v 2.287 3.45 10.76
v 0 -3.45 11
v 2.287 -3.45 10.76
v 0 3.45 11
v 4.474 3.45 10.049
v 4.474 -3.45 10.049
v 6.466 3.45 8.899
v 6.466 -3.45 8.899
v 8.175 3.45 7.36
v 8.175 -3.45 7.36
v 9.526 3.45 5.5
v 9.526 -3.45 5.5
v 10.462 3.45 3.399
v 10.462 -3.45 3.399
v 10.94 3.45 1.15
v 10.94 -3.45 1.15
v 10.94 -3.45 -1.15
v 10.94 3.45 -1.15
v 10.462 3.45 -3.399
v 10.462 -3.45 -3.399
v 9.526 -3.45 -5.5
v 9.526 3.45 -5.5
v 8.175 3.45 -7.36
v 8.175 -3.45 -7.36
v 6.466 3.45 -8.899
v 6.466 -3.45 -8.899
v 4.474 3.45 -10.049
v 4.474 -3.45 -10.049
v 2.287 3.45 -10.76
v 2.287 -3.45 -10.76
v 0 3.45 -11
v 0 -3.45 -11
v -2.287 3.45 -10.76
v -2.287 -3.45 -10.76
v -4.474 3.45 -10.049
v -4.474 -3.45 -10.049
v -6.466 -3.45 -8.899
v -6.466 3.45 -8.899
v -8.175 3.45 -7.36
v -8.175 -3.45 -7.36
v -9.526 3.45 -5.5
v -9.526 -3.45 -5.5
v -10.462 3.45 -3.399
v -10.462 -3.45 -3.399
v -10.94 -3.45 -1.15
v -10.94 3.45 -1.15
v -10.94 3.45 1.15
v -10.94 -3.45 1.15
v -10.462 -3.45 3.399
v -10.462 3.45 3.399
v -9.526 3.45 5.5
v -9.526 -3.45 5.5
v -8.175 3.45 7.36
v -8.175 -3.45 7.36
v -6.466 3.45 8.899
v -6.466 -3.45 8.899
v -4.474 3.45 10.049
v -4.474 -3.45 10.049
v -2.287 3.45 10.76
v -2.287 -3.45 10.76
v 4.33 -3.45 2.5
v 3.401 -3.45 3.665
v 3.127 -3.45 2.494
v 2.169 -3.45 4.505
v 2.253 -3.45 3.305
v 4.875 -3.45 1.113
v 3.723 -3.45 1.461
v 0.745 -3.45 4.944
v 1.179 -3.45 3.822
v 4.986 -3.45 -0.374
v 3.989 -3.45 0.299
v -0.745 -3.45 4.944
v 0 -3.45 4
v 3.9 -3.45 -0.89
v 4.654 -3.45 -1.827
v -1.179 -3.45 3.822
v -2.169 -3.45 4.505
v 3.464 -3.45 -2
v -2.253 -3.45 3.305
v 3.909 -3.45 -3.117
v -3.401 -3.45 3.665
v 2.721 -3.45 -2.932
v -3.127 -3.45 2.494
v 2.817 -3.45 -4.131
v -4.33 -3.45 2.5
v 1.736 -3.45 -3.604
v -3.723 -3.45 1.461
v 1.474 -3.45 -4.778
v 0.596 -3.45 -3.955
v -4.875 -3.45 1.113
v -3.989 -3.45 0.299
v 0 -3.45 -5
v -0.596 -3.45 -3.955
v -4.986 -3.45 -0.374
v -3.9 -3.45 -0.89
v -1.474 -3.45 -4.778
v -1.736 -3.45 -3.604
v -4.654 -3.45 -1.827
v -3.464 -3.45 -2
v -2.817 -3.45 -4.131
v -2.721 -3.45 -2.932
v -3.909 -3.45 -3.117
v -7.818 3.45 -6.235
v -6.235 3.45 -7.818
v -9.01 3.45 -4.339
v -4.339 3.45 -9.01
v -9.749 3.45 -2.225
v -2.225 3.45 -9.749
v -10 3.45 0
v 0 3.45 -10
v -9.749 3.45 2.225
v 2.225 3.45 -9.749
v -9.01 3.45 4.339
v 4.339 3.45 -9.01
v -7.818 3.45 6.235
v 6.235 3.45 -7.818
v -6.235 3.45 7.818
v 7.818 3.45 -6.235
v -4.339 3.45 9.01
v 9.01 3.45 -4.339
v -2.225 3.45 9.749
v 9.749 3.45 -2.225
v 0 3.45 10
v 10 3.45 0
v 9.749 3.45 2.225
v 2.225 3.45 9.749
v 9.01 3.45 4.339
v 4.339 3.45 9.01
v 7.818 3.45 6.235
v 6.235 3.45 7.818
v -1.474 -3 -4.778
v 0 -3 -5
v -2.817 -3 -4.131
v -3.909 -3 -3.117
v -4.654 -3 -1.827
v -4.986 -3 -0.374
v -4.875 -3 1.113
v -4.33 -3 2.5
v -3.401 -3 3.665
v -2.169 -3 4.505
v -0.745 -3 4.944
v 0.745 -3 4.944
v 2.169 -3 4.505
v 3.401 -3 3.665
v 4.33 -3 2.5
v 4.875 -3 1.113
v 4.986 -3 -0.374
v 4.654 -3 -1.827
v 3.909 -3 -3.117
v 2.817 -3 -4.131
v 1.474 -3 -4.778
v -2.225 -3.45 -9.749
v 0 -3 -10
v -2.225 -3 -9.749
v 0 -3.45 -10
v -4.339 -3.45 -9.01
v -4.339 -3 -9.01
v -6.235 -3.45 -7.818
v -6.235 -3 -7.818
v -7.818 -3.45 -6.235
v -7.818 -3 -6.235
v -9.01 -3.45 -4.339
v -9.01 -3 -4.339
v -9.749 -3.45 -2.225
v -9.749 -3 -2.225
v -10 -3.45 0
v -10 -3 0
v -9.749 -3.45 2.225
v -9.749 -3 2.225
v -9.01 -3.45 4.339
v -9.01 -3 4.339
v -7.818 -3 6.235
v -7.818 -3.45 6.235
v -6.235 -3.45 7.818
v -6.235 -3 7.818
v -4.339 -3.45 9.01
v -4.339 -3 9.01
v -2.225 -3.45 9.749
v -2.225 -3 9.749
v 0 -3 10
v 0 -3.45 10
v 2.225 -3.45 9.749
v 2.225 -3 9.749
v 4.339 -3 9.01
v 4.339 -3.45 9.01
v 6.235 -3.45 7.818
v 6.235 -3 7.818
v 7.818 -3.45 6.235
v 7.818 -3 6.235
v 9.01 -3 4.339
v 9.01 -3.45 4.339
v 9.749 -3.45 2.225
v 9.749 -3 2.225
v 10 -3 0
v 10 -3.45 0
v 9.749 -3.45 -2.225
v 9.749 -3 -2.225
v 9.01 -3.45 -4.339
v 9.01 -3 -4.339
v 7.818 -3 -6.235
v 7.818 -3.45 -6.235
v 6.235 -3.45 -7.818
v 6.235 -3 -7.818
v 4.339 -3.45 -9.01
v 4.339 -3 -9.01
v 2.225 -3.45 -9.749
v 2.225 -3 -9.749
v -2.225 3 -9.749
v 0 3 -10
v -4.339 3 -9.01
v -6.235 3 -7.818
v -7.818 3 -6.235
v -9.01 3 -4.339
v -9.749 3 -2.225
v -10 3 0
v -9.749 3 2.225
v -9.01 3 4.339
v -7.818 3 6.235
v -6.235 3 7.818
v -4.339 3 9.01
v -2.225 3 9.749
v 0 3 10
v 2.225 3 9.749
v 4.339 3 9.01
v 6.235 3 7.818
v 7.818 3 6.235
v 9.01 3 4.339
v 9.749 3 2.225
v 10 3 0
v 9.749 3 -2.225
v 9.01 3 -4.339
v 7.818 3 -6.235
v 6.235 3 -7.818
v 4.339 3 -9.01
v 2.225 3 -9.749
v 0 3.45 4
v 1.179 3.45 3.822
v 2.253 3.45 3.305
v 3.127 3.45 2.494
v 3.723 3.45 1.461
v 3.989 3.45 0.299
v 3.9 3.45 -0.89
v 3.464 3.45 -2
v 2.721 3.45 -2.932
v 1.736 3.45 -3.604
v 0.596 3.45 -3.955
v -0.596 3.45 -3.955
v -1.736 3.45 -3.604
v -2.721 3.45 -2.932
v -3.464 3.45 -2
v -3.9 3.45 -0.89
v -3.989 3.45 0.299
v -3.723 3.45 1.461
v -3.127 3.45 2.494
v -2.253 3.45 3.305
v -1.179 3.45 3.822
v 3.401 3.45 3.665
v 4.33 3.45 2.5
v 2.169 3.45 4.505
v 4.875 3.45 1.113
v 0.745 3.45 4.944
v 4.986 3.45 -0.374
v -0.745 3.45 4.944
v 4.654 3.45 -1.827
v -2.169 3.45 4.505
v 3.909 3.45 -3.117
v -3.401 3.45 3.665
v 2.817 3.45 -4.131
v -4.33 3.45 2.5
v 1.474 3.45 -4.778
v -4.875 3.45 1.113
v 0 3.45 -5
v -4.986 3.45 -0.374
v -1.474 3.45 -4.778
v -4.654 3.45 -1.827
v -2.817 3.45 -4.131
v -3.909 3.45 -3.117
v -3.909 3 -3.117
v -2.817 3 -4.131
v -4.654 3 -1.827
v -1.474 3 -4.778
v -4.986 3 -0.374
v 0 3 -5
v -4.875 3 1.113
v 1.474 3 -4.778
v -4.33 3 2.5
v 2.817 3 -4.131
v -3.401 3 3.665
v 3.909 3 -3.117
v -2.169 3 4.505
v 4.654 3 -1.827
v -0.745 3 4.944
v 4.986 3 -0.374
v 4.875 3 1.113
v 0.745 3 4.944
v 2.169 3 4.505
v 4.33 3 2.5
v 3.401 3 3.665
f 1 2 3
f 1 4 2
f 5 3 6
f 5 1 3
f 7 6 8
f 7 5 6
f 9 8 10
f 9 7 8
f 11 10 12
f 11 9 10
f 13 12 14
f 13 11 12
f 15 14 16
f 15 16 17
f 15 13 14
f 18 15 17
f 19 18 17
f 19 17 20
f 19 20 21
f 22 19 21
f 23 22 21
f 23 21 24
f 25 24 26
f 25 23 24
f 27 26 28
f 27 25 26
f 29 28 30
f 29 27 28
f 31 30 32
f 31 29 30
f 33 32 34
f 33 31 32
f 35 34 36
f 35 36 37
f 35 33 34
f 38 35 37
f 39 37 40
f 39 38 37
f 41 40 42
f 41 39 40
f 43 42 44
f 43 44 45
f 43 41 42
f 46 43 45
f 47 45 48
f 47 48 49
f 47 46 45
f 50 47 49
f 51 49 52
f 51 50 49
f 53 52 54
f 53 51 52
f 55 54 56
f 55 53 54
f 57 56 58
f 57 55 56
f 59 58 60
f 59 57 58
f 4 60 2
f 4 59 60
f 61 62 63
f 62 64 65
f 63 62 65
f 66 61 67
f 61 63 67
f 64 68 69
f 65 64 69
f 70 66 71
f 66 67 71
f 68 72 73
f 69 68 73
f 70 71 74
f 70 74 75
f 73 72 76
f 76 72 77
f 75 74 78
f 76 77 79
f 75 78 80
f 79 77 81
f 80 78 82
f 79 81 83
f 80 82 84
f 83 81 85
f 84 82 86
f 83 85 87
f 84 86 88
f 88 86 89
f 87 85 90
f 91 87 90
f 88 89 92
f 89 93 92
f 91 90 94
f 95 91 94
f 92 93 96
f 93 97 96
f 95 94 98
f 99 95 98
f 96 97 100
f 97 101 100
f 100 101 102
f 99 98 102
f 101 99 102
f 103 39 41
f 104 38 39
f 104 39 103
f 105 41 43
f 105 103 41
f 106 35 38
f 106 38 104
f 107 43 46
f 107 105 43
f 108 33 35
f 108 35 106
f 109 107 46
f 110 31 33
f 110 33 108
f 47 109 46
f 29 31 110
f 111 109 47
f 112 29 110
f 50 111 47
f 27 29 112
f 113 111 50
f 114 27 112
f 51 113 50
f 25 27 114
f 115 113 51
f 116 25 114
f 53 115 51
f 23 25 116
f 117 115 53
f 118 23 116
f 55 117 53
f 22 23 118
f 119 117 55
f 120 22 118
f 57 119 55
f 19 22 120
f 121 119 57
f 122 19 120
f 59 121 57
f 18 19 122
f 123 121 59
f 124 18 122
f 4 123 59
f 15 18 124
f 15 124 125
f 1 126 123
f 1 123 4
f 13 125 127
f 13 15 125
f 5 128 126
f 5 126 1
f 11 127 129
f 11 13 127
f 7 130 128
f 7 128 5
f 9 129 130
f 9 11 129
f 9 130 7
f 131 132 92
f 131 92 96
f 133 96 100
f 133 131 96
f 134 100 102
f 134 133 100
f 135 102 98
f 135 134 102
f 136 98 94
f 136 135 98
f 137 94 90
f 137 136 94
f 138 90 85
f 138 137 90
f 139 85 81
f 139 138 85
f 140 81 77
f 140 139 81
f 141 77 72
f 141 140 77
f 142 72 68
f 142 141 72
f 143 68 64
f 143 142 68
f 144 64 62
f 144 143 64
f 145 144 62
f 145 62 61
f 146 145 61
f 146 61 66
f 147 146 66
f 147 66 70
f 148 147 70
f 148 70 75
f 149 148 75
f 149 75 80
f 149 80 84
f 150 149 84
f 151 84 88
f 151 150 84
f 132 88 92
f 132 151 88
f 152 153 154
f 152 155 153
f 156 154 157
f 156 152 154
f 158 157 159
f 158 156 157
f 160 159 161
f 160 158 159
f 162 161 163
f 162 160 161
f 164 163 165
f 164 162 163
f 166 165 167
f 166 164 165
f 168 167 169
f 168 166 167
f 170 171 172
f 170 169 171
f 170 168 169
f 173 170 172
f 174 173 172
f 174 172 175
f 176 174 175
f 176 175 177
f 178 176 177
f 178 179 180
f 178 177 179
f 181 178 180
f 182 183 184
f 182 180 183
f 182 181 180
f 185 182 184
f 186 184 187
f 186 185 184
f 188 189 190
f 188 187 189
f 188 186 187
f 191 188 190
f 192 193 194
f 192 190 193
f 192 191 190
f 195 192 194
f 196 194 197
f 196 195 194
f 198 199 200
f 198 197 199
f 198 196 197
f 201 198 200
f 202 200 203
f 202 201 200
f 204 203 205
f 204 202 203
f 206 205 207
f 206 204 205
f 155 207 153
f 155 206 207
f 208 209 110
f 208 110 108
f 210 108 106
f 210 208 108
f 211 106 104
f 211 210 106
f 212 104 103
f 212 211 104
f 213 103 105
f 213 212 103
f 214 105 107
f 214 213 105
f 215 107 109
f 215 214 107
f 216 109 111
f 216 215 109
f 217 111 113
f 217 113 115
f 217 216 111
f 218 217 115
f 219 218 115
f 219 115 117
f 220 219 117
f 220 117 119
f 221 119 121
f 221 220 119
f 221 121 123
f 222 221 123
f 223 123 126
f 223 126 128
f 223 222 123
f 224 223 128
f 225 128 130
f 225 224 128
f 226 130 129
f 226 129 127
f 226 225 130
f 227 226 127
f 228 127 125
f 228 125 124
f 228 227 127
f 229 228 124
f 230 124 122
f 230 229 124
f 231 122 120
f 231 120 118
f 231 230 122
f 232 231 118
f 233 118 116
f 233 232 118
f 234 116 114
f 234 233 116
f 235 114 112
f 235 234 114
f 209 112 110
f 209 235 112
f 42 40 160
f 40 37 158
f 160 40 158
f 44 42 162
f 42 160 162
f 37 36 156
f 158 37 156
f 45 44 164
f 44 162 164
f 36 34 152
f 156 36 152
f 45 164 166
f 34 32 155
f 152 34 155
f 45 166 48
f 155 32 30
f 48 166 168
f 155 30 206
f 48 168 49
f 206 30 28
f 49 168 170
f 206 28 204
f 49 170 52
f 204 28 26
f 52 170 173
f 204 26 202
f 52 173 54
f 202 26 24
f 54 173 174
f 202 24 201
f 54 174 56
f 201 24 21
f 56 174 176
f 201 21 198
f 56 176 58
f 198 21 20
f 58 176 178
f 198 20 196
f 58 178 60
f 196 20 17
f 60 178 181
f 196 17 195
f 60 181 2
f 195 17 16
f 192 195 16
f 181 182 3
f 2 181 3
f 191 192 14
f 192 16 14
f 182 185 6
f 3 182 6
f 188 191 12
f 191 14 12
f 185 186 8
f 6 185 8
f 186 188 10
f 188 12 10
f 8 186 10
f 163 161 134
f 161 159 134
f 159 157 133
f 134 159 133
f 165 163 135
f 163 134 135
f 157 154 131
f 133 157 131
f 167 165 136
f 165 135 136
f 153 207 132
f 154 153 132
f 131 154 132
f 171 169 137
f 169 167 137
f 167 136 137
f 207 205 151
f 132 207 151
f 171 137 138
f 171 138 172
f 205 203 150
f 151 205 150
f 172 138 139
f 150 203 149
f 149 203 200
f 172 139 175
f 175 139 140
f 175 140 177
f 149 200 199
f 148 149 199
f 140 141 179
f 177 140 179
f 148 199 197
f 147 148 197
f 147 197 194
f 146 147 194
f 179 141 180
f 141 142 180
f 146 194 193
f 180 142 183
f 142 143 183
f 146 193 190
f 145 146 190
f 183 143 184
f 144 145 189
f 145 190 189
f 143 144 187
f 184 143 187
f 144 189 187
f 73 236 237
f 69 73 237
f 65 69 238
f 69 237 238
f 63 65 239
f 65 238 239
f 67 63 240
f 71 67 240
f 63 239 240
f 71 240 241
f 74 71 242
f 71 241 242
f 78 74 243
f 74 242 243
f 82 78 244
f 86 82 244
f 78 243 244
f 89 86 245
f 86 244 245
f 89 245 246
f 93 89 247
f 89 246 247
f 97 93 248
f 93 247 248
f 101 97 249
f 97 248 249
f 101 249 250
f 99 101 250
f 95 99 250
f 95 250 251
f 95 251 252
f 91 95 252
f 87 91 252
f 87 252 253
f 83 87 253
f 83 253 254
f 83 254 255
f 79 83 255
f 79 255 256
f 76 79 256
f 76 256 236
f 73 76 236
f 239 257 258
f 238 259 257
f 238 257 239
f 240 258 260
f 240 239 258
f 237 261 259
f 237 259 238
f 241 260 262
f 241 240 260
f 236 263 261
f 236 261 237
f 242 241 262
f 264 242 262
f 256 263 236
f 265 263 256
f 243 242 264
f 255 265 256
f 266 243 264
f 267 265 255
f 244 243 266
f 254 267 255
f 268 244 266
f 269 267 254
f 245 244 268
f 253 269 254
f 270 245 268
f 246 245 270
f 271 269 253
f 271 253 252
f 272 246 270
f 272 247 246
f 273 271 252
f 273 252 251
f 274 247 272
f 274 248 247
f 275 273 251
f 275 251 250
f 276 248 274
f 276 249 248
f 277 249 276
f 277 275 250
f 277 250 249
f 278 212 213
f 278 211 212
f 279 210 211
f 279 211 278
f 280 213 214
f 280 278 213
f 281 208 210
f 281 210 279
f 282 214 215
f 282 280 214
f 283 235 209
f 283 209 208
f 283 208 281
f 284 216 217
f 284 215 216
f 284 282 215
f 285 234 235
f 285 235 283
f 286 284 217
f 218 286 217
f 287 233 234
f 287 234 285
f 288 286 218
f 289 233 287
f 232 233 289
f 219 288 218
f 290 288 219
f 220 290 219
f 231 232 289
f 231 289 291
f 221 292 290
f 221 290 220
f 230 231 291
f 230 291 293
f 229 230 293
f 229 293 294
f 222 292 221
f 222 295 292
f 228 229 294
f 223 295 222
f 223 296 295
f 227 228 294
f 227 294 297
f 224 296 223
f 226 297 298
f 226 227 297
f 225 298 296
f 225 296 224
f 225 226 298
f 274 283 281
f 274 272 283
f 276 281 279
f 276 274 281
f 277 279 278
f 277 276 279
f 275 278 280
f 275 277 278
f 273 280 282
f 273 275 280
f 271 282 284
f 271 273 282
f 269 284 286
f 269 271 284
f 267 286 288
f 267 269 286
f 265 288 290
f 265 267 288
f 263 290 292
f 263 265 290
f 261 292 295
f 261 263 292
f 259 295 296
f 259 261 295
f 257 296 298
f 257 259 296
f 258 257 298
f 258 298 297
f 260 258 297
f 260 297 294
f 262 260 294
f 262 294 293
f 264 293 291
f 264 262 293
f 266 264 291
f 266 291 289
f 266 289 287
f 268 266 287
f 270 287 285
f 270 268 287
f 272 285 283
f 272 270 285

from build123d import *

# Parameters (mm, degrees)
SKETCH1_R           = 11
BOSS_EXTRUDE1_DEPTH = 3
SKETCH2_R           = 11
SKETCH2_R_2         = 10
BOSS_EXTRUDE2_DEPTH = 3.45
SKETCH4_R           = 5
BOSS_EXTRUDE3_DEPTH = 3.45
SKETCH5_R           = 4
CUT_EXTRUDE1_DEPTH  = 10


with BuildPart() as part:
    # Sketch1 → Boss-Extrude1 (new, symmetric)
    with BuildSketch(Plane(origin=(0, 0, 0), x_dir=(1, 0, 0), z_dir=(0, 1, 0))):
        with Locations(Location((0, 0, 0), (0, 0, 270))):
            Circle(SKETCH1_R)
    extrude(amount=BOSS_EXTRUDE1_DEPTH, both=True)

    # Sketch2 → Boss-Extrude2 (add, symmetric)
    with BuildSketch(Plane(origin=(0, 0, 0), x_dir=(1, 0, 0), z_dir=(0, 1, 0))):
        with Locations(Location((0, 0, 0), (0, 0, 270))):
            Circle(SKETCH2_R)
        with Locations(Location((0, 0, 0), (0, 0, 90))):
            Circle(SKETCH2_R_2, mode=Mode.SUBTRACT)
    extrude(amount=BOSS_EXTRUDE2_DEPTH, both=True)

    # Sketch4 → Boss-Extrude3 (add, symmetric)
    with BuildSketch(Plane(origin=(0, 0, 0), x_dir=(1, 0, 0), z_dir=(0, 1, 0))):
        with Locations(Location((0, 0, 0), (0, 0, 90))):
            Circle(SKETCH4_R)
    extrude(amount=BOSS_EXTRUDE3_DEPTH, both=True)

    # Sketch5 → Cut-Extrude1 (cut)
    with BuildSketch(Plane(origin=(0, 3.45, 0), x_dir=(1, 0, 0), z_dir=(0, 1, 0))):
        with Locations(Location((0, 0, 0), (0, 0, 270))):
            Circle(SKETCH5_R)
    extrude(amount=-CUT_EXTRUDE1_DEPTH, mode=Mode.SUBTRACT)


solid = part.part
